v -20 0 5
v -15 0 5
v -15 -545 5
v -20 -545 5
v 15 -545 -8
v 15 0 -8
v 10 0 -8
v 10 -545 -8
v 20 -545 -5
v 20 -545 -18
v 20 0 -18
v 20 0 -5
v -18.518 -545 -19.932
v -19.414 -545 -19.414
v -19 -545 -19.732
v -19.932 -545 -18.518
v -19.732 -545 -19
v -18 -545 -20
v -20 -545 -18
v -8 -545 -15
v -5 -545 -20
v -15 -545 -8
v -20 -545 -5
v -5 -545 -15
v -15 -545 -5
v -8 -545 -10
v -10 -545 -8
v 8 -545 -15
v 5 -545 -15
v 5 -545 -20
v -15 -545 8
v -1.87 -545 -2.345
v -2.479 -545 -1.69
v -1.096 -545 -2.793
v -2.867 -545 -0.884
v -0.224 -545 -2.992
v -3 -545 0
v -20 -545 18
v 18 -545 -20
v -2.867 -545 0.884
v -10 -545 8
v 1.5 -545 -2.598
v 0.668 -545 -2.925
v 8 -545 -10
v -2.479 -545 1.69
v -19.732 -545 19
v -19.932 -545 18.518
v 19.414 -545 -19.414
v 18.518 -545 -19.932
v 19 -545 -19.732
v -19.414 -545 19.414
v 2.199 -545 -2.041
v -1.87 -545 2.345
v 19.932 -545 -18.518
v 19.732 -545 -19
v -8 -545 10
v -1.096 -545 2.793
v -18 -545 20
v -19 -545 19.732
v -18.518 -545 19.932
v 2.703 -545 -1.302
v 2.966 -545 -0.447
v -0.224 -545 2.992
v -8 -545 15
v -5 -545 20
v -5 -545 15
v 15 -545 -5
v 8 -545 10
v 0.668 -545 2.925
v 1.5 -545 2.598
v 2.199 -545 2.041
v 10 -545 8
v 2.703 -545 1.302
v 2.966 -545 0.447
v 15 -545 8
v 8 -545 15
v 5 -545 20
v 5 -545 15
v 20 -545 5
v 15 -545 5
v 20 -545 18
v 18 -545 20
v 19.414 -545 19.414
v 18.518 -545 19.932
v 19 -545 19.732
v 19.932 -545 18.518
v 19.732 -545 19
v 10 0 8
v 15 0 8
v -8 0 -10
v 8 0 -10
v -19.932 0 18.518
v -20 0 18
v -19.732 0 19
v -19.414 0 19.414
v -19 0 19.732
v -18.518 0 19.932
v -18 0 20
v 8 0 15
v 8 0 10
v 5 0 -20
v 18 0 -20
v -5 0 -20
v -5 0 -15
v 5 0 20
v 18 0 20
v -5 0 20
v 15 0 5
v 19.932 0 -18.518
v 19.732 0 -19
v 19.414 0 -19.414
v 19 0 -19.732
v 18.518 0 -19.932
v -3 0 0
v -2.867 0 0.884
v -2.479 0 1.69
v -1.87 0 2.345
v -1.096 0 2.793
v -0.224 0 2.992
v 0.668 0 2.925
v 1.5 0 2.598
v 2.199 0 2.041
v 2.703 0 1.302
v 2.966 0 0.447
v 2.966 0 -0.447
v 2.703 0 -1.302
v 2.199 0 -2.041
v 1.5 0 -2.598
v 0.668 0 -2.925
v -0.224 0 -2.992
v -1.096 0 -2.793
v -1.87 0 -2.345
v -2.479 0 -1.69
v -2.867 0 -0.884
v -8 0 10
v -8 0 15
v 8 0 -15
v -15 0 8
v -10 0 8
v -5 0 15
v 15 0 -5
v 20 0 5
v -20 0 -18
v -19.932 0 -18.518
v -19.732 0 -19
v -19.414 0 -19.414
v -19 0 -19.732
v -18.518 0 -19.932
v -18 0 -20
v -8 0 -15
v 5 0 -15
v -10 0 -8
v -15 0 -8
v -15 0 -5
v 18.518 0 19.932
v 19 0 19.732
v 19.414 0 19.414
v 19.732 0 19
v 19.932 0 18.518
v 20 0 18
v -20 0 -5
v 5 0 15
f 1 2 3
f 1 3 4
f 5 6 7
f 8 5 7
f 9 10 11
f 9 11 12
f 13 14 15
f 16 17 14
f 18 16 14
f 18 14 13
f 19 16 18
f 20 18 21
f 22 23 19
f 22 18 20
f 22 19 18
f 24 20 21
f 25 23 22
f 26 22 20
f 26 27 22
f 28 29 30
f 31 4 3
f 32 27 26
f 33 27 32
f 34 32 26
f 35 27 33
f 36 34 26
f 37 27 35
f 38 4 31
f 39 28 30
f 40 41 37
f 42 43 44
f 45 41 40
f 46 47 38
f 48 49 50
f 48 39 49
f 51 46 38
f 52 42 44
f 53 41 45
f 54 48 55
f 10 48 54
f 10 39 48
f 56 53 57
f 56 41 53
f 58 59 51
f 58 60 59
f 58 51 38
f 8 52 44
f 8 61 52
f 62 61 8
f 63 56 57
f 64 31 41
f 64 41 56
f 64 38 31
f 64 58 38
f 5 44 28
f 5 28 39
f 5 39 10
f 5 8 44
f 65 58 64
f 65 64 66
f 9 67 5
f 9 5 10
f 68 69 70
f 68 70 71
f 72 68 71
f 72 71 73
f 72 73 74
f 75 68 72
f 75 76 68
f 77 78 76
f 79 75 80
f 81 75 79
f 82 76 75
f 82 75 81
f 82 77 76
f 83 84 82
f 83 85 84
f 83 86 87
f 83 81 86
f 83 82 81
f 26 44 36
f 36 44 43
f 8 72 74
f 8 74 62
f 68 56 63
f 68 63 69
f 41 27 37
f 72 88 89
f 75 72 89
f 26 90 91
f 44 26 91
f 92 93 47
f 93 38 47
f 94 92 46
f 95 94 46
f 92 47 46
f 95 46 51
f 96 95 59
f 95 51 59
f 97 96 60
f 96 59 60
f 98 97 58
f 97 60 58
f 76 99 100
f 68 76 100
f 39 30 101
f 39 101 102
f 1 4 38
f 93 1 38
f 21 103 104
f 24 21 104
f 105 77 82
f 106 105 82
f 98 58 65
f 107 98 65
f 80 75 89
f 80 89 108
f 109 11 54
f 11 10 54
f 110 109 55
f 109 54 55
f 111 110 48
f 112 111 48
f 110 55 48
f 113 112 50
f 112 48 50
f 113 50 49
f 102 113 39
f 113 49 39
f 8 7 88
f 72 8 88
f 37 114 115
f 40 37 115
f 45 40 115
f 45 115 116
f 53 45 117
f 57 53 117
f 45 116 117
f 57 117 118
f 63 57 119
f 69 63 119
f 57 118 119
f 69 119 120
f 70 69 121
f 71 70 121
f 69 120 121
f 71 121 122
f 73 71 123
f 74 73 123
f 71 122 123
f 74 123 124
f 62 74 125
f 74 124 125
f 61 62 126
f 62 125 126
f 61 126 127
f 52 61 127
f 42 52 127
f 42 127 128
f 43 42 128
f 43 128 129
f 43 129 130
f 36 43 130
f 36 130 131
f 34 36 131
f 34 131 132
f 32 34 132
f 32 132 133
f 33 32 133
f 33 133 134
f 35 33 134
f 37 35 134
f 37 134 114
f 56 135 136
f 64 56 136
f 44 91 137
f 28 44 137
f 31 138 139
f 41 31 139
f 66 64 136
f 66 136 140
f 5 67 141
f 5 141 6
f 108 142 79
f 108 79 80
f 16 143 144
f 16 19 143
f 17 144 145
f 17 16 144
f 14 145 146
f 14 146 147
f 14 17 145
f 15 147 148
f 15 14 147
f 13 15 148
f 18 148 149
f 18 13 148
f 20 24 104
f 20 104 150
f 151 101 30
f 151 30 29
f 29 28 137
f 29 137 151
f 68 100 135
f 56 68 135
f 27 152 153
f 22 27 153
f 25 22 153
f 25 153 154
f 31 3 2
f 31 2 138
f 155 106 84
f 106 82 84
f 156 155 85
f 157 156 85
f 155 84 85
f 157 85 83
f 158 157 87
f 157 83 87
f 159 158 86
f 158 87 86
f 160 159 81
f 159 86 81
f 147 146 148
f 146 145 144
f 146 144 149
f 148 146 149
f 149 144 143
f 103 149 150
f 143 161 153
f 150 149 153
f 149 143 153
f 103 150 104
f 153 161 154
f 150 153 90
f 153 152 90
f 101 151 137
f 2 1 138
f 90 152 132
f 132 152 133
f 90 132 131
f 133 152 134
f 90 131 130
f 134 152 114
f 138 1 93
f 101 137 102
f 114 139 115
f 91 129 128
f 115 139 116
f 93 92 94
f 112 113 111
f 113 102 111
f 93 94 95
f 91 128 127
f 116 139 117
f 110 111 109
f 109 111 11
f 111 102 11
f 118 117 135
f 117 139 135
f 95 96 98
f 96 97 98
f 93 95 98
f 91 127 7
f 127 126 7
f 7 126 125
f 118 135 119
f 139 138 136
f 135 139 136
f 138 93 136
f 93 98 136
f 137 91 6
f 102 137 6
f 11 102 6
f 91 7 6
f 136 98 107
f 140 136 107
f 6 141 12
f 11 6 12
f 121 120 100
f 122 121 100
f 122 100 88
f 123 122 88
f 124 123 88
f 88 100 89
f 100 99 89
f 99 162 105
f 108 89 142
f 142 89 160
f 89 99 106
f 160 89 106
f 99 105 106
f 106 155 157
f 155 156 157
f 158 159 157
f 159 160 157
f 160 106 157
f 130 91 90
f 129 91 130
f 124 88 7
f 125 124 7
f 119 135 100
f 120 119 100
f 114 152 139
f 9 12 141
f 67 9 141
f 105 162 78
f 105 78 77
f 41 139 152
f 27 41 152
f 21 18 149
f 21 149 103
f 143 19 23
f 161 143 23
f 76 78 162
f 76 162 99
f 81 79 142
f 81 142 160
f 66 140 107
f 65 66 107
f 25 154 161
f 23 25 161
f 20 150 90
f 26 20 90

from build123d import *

# Parameters (mm, degrees)
F0_W     = 40
F0_H     = 40
F1_DEPTH = 545
F2_W     = 5
F2_H     = 10
F2_W_2   = 10
F2_H_2   = 5
F2_R     = 3
F3_DEPTH = 545.001
F4_R     = 2


with BuildPart() as f1:
    # F0 (on Front) → F1 (new body)
    with BuildSketch(Plane.XZ):
        Rectangle(F0_W, F0_H)
    extrude(amount=F1_DEPTH)

    # F2 (on face) → F3 (cut, through all)
    with BuildSketch(Plane(origin=(0, 0, 0), x_dir=(-1, 0, 0), z_dir=(0, 1, 0))):
        with Locations((-17.5, 0)):
            Rectangle(F2_W, F2_H)
        Polygon((-15, 8), (-15, 5), (-15, -5), (-15, -8), (-10, -8), (-10, 8), align=None)
        Polygon((5, 15), (-5, 15), (-8, 15), (-8, 10), (8, 10), (8, 15), align=None)
        with Locations((0, 17.5)):
            Rectangle(F2_W_2, F2_H_2)
        Polygon((15, -5), (15, 5), (15, 8), (10, 8), (10, -8), (15, -8), align=None)
        with Locations((17.5, 0)):
            Rectangle(F2_W, F2_H)
        Circle(F2_R)
        Polygon((-8, -15), (-5, -15), (5, -15), (8, -15), (8, -10), (-8, -10), align=None)
        with Locations((0, -17.5)):
            Rectangle(F2_W_2, F2_H_2)
    extrude(amount=-F3_DEPTH, mode=Mode.SUBTRACT)

    # F4
    f4_edges = [f1.edges().sort_by_distance(p)[0] for p in [
        (20, -272.5, 20),
        (-20, -272.5, 20),
        (20, -272.5, -20),
        (-20, -272.5, -20),
    ]]
    fillet(f4_edges, radius=F4_R)


solid = f1.part
